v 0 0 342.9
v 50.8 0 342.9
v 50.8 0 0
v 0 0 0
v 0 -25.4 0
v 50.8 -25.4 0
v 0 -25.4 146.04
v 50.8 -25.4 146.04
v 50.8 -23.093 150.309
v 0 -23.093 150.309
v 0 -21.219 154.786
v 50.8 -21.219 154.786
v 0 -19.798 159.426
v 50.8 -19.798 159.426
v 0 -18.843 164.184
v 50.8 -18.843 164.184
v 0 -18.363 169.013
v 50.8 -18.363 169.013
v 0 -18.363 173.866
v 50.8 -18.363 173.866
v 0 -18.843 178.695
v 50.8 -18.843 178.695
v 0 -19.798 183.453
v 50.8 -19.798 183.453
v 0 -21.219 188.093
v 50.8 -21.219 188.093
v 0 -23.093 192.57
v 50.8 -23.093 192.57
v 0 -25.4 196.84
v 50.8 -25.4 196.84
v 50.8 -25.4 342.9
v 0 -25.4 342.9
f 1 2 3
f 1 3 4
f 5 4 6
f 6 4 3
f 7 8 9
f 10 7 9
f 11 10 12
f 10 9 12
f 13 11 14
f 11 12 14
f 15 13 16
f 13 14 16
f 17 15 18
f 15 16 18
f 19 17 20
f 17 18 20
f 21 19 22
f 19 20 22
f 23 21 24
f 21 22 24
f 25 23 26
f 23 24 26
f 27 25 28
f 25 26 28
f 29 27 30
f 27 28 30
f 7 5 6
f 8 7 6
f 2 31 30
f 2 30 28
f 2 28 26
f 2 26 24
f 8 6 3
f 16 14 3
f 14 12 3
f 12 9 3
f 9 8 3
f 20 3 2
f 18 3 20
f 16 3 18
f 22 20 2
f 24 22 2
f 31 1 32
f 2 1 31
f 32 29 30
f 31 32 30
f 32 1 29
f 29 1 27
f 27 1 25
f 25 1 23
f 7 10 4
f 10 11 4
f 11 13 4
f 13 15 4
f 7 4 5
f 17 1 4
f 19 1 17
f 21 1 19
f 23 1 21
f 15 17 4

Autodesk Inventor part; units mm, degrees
ref_plane "YZ Plane" through (0, 0, 0) normal (1, 0, 0) x (0, 1, 0)
ref_plane "XZ Plane" through (0, 0, 0) normal (0, 1, 0) x (-1, 0, 0)
ref_plane "XY Plane" through (0, 0, 0) normal (0, 0, 1) x (1, 0, 0)
sketch "Sketch1" plane through (0, 0, 0) normal (0, 0, 1) x (1, 0, 0)
  line L0 (0, 0) -> (0, -25.4)
  line L1 (0, -25.4) -> (50.8, -25.4)
  line L2 (50.8, -25.4) -> (50.8, 0)
  line L3 (50.8, 0) -> (0, 0)
  dimension "d0" = 25.4
  dimension "d1" = 50.8
extrude "Extrusion1" add sketch "Sketch1" along normal blind 342.9
sketch "Sketch3" plane through (50.8, -25.4, 0) normal (1, 0, 0) x (0, 0, -1)
  line L0 (0, 0) -> (-342.9, 0) projected
  line L1 (-171.45, 0) -> (-196.8396, 0)
  line L2 (-196.8396, 0) -> (-146.0396, 0)
  arc A0 (-146.0396, 0) -> (-196.8396, 0) centre (-171.4396, -41.9008) ccw
  line L3 (-171.45, 0) -> (-171.45, 25.4)
  point P0 (0, 25.4)
  dimension "d10" = 50.8
extrude "Extrusion2" cut sketch "Sketch3" against normal through all
properties part number "connectingthing" material "Aluminum 6061"
